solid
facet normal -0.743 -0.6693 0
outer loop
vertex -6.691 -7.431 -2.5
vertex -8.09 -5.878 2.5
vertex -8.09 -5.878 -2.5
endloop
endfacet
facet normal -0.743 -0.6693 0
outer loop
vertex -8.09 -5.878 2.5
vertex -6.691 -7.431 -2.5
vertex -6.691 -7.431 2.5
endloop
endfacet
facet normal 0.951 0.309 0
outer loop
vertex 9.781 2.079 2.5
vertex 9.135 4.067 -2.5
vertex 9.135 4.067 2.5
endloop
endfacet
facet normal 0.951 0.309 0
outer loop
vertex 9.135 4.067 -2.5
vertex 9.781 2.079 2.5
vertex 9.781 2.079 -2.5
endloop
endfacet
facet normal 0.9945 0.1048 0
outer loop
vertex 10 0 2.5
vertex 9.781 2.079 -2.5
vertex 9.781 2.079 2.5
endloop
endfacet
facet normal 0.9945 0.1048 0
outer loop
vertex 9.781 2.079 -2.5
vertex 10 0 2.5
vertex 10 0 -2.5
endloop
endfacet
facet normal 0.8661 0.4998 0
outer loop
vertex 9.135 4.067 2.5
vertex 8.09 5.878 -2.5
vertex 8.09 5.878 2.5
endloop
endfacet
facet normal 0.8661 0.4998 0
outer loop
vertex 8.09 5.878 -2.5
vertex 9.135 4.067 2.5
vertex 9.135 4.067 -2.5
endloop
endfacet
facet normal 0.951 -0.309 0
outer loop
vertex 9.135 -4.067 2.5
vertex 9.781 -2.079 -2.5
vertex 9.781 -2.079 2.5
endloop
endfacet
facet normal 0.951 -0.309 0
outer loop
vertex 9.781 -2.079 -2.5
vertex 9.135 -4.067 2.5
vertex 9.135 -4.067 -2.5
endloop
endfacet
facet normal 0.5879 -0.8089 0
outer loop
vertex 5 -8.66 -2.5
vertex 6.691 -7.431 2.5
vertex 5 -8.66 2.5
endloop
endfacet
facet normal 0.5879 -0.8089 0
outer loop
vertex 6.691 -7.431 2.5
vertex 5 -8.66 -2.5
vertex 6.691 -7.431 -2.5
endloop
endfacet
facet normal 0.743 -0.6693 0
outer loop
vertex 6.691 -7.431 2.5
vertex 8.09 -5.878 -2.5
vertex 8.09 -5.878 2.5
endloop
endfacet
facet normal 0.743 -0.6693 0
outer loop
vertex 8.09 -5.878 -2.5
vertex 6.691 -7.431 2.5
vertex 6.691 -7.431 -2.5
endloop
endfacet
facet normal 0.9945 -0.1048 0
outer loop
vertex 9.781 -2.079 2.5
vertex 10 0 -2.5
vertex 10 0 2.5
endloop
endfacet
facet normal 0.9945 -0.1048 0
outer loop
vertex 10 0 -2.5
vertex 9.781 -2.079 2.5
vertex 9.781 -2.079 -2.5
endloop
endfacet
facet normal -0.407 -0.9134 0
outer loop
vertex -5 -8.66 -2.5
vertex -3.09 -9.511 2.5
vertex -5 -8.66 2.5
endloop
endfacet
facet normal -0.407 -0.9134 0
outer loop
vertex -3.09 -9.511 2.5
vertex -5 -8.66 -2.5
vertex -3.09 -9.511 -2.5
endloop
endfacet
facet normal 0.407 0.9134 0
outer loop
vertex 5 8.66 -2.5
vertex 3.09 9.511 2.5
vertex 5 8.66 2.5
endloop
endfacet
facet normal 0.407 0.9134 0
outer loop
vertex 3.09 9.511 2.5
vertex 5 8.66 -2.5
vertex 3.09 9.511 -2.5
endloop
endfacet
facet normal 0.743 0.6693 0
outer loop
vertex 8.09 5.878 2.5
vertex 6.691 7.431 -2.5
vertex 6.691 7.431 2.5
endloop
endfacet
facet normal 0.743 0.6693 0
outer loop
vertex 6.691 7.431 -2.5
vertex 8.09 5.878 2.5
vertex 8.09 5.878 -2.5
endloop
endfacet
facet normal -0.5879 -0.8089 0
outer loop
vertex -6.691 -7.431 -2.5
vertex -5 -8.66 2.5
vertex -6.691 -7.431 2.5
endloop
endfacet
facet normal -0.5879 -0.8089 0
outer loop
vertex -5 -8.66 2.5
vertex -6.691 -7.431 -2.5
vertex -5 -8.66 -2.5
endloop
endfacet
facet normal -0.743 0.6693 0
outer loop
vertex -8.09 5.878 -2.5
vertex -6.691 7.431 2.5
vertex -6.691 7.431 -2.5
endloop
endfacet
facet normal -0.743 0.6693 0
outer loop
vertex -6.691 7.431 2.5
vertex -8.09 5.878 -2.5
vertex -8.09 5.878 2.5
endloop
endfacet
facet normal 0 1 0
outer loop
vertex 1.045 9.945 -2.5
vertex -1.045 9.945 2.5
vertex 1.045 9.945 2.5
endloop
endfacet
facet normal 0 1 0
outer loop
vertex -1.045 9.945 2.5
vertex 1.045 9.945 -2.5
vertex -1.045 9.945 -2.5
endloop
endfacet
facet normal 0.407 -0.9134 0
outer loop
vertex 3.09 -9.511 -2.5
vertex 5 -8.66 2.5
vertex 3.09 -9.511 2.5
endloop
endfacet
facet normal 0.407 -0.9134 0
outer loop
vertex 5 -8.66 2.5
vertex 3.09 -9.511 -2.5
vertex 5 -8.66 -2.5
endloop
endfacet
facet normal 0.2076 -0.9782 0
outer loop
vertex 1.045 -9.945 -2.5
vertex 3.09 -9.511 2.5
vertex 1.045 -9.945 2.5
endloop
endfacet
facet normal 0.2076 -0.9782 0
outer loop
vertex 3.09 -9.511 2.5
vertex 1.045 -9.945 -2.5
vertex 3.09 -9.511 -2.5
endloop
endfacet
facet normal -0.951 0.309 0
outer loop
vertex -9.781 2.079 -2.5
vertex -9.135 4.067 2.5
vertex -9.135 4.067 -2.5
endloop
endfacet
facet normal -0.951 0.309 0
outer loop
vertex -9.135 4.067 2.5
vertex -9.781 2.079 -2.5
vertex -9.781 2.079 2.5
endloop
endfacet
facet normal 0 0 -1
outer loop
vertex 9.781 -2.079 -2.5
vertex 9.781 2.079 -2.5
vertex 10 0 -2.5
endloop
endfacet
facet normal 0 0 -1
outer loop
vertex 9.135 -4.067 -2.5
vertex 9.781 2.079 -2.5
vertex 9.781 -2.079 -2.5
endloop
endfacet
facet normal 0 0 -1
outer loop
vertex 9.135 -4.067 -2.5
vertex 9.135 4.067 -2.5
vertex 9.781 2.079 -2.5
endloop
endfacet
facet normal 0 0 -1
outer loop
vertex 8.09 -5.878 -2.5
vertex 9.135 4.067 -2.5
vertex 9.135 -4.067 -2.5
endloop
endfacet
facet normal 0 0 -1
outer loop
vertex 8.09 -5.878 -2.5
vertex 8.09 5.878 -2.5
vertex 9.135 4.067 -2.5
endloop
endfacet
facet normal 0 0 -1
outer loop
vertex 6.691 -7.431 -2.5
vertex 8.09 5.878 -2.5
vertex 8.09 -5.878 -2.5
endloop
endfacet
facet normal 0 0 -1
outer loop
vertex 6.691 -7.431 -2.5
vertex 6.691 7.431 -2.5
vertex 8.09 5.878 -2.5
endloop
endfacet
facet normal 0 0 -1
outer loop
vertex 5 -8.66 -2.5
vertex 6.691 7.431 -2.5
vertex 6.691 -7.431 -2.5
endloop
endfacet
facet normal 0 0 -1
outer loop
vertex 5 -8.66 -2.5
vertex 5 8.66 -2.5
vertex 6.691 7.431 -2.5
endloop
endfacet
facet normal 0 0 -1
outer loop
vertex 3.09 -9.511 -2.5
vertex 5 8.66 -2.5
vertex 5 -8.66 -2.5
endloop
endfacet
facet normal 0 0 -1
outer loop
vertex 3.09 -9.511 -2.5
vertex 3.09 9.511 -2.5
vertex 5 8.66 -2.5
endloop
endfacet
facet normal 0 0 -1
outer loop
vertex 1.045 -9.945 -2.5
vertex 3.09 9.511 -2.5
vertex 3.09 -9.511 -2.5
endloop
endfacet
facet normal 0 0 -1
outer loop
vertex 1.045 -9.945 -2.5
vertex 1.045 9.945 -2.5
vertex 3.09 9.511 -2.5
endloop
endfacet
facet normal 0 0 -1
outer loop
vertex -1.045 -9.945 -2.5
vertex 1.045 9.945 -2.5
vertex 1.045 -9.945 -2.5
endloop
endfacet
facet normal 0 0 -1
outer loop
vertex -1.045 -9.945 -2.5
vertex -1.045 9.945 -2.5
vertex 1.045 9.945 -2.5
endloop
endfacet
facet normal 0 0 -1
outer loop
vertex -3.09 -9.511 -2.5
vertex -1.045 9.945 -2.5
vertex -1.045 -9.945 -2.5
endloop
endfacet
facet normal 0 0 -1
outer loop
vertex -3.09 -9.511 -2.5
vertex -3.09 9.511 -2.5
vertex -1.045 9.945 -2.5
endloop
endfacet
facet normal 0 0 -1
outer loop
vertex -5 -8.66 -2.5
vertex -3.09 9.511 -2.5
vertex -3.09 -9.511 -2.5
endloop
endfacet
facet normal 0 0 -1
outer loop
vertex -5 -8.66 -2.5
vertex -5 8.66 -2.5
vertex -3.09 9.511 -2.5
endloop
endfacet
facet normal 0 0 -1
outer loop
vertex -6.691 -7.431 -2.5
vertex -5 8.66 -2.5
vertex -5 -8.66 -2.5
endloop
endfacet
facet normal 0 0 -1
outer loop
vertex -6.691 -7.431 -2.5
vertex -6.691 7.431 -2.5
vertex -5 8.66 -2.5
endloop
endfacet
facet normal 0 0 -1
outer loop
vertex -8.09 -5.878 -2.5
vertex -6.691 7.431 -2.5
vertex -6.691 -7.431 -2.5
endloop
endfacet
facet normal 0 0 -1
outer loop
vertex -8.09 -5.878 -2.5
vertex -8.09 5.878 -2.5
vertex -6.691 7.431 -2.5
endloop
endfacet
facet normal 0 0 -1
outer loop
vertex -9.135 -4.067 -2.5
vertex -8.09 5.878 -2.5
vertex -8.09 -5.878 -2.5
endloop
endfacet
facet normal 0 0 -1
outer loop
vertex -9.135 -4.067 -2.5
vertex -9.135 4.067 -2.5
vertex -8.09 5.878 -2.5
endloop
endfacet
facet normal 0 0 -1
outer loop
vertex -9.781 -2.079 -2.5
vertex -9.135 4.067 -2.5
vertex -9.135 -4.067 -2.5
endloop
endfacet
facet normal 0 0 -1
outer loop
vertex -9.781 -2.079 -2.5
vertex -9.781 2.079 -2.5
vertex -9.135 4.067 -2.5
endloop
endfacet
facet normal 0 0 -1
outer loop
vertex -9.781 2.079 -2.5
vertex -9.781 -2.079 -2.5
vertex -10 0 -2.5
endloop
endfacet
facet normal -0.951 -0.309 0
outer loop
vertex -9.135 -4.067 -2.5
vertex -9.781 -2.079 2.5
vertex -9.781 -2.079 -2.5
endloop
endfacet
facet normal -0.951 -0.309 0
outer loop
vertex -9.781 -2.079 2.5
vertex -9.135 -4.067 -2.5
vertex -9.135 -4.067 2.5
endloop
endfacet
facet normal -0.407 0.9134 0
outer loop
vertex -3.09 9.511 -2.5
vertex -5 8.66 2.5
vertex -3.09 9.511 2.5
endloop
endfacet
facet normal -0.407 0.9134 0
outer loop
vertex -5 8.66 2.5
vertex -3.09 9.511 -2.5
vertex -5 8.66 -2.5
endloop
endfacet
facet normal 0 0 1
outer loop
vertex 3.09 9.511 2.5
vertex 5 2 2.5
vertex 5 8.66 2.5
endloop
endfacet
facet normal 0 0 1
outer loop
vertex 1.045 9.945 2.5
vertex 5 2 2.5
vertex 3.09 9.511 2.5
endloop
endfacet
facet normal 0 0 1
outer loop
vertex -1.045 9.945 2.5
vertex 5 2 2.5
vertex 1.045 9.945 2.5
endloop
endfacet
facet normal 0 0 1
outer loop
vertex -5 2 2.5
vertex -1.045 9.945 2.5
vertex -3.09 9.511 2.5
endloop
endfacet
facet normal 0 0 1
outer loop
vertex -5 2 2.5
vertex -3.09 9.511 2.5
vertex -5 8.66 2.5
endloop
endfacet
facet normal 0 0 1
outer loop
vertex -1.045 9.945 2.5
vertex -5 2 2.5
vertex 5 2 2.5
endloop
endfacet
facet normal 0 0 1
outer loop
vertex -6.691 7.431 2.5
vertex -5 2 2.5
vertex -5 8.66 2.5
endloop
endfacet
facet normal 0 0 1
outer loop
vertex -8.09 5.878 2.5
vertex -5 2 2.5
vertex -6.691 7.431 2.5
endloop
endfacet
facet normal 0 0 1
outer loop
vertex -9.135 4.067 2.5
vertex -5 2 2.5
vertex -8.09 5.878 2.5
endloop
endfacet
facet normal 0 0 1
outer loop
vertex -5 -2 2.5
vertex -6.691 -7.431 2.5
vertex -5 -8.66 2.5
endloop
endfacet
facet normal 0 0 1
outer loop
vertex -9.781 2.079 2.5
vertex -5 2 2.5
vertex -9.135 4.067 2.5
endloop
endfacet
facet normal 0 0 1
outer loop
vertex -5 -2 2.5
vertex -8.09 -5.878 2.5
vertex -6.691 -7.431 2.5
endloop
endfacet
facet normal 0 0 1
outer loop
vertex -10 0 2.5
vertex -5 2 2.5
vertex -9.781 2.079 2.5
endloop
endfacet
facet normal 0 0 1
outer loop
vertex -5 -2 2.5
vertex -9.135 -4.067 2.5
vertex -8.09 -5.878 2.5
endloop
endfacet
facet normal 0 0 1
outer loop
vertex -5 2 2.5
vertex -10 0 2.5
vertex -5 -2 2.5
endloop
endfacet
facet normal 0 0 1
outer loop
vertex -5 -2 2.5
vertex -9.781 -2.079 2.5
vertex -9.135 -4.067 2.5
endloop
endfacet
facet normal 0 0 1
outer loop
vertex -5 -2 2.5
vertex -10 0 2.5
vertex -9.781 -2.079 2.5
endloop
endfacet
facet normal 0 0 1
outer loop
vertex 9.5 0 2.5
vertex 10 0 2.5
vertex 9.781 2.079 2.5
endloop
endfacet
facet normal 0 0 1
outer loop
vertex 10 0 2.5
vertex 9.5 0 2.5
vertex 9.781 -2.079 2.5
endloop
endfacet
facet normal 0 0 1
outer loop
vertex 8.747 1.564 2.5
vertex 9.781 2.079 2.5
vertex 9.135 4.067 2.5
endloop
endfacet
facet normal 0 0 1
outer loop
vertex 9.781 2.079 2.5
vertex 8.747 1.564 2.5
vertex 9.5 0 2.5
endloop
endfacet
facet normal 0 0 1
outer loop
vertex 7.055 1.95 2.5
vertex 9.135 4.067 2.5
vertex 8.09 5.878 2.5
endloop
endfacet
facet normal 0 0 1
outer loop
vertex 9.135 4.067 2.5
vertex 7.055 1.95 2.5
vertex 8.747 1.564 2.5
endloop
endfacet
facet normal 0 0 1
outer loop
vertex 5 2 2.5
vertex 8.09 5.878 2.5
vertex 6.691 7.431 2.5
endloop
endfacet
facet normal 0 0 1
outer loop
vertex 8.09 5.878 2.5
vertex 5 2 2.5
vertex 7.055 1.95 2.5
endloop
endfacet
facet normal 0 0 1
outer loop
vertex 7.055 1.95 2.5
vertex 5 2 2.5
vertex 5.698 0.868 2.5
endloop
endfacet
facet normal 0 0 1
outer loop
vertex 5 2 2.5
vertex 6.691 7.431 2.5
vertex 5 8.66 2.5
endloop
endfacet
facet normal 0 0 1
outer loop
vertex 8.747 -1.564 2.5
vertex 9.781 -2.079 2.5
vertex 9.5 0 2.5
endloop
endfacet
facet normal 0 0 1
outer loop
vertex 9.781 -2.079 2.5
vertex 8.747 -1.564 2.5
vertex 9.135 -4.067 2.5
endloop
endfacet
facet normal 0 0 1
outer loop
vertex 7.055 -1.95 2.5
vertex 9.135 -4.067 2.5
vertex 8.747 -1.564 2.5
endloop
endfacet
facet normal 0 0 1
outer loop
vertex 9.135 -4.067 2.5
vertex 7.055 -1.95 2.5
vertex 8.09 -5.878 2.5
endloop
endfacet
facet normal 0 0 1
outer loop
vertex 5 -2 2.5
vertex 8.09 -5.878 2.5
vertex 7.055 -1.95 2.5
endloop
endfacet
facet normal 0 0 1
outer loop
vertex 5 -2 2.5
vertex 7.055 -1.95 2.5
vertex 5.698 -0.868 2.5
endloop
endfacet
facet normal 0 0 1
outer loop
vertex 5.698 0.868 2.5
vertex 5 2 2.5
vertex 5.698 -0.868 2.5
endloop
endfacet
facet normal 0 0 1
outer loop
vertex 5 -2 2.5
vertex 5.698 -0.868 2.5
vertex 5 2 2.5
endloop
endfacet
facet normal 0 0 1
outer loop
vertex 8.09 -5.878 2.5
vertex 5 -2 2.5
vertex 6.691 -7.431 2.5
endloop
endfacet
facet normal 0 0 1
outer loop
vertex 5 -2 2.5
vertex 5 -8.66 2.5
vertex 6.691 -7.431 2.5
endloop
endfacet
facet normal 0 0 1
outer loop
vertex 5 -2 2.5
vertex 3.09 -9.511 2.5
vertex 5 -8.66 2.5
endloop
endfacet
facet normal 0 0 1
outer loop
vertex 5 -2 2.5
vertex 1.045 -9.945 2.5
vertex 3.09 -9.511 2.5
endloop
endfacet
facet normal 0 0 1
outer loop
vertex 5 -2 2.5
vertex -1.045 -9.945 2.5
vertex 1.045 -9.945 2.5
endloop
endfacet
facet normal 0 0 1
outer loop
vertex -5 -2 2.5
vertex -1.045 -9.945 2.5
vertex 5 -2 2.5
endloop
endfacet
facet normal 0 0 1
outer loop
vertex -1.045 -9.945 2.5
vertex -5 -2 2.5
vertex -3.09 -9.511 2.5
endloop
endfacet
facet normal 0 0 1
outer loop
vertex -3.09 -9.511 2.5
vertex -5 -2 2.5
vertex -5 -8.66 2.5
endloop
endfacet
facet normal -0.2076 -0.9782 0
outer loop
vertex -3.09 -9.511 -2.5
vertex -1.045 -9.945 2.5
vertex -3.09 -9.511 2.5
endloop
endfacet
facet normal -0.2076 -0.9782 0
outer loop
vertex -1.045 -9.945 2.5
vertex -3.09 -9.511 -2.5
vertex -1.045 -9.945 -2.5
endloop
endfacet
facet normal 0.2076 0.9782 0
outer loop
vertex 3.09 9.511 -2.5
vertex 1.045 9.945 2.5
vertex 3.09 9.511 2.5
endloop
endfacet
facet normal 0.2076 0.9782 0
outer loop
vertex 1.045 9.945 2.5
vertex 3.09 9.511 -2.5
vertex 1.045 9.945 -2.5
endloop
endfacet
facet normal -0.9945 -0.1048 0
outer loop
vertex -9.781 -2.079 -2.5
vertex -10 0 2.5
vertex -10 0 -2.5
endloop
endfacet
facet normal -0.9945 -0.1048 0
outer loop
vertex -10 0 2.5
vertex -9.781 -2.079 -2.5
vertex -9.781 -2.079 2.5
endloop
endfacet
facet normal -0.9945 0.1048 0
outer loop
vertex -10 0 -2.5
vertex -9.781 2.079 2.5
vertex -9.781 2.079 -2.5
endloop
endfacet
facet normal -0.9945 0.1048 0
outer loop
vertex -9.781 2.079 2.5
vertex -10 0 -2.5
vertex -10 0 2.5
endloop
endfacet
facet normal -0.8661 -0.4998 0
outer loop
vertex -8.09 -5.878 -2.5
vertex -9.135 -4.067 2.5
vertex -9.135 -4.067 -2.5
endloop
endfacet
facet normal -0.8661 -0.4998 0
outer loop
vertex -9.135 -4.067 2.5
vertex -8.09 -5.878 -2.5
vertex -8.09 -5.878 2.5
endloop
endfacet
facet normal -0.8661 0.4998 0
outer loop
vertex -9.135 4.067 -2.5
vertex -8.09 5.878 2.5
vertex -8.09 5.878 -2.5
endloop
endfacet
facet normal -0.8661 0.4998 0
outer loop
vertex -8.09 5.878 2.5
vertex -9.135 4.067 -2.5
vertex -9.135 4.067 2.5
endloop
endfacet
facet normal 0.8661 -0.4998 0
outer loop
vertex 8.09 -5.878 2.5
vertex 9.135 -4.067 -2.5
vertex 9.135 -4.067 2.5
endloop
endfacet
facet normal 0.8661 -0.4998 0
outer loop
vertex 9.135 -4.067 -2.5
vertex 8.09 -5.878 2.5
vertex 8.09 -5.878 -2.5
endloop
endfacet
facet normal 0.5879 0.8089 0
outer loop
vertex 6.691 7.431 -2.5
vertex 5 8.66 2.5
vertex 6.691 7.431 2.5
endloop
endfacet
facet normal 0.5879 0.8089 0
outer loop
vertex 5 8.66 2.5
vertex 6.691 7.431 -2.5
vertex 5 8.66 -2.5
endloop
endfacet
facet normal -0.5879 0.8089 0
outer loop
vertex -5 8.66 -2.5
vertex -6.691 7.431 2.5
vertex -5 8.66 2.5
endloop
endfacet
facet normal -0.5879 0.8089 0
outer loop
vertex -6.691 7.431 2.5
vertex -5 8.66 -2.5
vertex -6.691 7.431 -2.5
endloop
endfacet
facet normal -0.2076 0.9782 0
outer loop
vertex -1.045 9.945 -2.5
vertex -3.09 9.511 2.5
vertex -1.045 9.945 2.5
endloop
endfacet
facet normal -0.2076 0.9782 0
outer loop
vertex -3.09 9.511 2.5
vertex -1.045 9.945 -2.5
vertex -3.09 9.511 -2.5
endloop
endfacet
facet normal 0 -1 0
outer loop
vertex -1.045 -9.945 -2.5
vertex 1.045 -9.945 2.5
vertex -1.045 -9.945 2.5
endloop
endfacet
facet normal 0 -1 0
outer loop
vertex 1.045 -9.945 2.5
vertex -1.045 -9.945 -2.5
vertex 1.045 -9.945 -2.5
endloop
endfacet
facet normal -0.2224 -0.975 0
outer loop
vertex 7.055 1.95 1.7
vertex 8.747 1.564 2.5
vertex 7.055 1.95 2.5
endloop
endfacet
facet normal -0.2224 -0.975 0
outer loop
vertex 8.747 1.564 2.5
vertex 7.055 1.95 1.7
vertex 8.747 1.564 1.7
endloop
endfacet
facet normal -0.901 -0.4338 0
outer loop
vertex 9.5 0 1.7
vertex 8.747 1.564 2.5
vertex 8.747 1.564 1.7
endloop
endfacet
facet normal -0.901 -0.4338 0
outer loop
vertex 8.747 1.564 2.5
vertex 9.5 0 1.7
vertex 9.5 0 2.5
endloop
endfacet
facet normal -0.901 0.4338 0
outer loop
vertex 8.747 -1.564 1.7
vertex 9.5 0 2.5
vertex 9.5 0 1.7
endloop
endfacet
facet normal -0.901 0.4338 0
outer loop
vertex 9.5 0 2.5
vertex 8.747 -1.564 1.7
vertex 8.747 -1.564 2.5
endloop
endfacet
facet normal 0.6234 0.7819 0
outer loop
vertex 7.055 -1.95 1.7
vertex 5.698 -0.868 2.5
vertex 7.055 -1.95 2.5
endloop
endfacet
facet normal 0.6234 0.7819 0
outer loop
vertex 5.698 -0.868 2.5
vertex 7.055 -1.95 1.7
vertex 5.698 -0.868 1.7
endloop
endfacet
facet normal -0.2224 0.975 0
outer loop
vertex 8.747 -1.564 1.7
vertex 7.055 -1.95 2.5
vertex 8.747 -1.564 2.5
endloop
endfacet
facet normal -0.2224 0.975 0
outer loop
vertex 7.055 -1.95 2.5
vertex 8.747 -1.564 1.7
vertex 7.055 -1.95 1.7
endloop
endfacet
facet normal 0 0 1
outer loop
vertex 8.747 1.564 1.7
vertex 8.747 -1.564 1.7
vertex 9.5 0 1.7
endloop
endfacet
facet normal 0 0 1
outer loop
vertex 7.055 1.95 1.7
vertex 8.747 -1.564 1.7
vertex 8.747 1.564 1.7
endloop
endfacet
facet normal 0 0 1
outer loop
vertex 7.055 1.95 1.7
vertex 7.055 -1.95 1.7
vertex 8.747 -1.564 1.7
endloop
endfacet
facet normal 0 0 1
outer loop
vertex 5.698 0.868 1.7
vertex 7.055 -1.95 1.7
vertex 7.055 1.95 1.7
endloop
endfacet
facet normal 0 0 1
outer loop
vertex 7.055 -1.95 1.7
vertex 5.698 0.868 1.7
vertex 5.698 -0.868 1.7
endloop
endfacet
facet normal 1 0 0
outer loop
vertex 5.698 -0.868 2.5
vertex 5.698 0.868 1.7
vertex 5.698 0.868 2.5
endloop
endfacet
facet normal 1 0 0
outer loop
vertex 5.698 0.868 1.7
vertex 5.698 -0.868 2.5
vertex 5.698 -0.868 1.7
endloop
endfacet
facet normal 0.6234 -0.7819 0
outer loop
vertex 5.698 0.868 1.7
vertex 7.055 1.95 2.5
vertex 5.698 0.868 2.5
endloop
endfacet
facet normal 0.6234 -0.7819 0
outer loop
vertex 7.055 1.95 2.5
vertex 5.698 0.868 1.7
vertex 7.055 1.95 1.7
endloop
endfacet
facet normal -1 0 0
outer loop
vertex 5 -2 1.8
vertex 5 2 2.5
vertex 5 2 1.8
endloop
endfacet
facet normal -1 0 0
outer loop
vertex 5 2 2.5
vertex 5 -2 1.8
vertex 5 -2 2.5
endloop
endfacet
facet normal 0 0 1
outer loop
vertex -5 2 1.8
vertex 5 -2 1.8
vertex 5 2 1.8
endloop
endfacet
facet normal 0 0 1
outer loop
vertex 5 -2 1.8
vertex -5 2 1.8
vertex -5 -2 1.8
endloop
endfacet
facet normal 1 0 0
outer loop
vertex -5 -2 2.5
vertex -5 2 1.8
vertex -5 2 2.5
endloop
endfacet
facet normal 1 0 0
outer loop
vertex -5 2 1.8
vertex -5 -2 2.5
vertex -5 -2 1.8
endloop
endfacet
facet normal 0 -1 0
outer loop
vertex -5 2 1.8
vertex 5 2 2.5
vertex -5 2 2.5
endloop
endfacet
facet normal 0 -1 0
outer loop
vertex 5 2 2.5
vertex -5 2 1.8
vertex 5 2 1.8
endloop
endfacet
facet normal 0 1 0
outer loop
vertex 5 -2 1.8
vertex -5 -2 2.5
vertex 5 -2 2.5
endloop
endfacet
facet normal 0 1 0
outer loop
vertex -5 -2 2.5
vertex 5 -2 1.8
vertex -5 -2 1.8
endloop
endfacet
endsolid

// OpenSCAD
// Parameters
magnet_diameter = 20; //[10:40:1]
magnet_thickness = 5; //[2.5:10:0.5]
chamfer_size = 0.5; //[0.25:1.5:0.05]
polarity_mark_diameter = 4; //[2:10:0.5]
polarity_mark_depth = 0.4; //[0.2:1:0.05]
engraved_label_depth = 0.3; //[0.2:1:0.05]
engraved_label_width = 10; //[5:20:0.5]
engraved_label_height = 4; //[2:10:0.5]
overlap = 0.8; //[0.5:2:0.1]

// Magnet Body
module magnet_body() {
  cylinder(h=magnet_thickness, r=magnet_diameter/2, center=true);
}

// Edge Chamfer
module edge_chamfer() {
  cylinder(h=magnet_thickness + 2*chamfer_size, r=magnet_diameter/2 + chamfer_size, center=true);
}

// Polarity Marking
module polarity_marking() {
  translate([magnet_diameter/2 - polarity_mark_diameter/2 - chamfer_size, 0, magnet_thickness/2 - polarity_mark_depth/2])
    cylinder(h=polarity_mark_depth + overlap, r=polarity_mark_diameter/2, center=true);
}

// Engraved Label
module engraved_label() {
  translate([0, 0, magnet_thickness/2 - engraved_label_depth/2])
    cube([engraved_label_width, engraved_label_height, engraved_label_depth + overlap], center=true);
}

// Magnet with Chamfer
module magnet_with_chamfer() {
  intersection() {
    magnet_body();
    edge_chamfer();
  }
}

// Final Magnet
module magnet_final() {
  difference() {
    magnet_with_chamfer();
    polarity_marking();
    engraved_label();
  }
}

// Render the final magnet
color([0.8, 0.6, 0.2]) // Brass-like color
magnet_final();
